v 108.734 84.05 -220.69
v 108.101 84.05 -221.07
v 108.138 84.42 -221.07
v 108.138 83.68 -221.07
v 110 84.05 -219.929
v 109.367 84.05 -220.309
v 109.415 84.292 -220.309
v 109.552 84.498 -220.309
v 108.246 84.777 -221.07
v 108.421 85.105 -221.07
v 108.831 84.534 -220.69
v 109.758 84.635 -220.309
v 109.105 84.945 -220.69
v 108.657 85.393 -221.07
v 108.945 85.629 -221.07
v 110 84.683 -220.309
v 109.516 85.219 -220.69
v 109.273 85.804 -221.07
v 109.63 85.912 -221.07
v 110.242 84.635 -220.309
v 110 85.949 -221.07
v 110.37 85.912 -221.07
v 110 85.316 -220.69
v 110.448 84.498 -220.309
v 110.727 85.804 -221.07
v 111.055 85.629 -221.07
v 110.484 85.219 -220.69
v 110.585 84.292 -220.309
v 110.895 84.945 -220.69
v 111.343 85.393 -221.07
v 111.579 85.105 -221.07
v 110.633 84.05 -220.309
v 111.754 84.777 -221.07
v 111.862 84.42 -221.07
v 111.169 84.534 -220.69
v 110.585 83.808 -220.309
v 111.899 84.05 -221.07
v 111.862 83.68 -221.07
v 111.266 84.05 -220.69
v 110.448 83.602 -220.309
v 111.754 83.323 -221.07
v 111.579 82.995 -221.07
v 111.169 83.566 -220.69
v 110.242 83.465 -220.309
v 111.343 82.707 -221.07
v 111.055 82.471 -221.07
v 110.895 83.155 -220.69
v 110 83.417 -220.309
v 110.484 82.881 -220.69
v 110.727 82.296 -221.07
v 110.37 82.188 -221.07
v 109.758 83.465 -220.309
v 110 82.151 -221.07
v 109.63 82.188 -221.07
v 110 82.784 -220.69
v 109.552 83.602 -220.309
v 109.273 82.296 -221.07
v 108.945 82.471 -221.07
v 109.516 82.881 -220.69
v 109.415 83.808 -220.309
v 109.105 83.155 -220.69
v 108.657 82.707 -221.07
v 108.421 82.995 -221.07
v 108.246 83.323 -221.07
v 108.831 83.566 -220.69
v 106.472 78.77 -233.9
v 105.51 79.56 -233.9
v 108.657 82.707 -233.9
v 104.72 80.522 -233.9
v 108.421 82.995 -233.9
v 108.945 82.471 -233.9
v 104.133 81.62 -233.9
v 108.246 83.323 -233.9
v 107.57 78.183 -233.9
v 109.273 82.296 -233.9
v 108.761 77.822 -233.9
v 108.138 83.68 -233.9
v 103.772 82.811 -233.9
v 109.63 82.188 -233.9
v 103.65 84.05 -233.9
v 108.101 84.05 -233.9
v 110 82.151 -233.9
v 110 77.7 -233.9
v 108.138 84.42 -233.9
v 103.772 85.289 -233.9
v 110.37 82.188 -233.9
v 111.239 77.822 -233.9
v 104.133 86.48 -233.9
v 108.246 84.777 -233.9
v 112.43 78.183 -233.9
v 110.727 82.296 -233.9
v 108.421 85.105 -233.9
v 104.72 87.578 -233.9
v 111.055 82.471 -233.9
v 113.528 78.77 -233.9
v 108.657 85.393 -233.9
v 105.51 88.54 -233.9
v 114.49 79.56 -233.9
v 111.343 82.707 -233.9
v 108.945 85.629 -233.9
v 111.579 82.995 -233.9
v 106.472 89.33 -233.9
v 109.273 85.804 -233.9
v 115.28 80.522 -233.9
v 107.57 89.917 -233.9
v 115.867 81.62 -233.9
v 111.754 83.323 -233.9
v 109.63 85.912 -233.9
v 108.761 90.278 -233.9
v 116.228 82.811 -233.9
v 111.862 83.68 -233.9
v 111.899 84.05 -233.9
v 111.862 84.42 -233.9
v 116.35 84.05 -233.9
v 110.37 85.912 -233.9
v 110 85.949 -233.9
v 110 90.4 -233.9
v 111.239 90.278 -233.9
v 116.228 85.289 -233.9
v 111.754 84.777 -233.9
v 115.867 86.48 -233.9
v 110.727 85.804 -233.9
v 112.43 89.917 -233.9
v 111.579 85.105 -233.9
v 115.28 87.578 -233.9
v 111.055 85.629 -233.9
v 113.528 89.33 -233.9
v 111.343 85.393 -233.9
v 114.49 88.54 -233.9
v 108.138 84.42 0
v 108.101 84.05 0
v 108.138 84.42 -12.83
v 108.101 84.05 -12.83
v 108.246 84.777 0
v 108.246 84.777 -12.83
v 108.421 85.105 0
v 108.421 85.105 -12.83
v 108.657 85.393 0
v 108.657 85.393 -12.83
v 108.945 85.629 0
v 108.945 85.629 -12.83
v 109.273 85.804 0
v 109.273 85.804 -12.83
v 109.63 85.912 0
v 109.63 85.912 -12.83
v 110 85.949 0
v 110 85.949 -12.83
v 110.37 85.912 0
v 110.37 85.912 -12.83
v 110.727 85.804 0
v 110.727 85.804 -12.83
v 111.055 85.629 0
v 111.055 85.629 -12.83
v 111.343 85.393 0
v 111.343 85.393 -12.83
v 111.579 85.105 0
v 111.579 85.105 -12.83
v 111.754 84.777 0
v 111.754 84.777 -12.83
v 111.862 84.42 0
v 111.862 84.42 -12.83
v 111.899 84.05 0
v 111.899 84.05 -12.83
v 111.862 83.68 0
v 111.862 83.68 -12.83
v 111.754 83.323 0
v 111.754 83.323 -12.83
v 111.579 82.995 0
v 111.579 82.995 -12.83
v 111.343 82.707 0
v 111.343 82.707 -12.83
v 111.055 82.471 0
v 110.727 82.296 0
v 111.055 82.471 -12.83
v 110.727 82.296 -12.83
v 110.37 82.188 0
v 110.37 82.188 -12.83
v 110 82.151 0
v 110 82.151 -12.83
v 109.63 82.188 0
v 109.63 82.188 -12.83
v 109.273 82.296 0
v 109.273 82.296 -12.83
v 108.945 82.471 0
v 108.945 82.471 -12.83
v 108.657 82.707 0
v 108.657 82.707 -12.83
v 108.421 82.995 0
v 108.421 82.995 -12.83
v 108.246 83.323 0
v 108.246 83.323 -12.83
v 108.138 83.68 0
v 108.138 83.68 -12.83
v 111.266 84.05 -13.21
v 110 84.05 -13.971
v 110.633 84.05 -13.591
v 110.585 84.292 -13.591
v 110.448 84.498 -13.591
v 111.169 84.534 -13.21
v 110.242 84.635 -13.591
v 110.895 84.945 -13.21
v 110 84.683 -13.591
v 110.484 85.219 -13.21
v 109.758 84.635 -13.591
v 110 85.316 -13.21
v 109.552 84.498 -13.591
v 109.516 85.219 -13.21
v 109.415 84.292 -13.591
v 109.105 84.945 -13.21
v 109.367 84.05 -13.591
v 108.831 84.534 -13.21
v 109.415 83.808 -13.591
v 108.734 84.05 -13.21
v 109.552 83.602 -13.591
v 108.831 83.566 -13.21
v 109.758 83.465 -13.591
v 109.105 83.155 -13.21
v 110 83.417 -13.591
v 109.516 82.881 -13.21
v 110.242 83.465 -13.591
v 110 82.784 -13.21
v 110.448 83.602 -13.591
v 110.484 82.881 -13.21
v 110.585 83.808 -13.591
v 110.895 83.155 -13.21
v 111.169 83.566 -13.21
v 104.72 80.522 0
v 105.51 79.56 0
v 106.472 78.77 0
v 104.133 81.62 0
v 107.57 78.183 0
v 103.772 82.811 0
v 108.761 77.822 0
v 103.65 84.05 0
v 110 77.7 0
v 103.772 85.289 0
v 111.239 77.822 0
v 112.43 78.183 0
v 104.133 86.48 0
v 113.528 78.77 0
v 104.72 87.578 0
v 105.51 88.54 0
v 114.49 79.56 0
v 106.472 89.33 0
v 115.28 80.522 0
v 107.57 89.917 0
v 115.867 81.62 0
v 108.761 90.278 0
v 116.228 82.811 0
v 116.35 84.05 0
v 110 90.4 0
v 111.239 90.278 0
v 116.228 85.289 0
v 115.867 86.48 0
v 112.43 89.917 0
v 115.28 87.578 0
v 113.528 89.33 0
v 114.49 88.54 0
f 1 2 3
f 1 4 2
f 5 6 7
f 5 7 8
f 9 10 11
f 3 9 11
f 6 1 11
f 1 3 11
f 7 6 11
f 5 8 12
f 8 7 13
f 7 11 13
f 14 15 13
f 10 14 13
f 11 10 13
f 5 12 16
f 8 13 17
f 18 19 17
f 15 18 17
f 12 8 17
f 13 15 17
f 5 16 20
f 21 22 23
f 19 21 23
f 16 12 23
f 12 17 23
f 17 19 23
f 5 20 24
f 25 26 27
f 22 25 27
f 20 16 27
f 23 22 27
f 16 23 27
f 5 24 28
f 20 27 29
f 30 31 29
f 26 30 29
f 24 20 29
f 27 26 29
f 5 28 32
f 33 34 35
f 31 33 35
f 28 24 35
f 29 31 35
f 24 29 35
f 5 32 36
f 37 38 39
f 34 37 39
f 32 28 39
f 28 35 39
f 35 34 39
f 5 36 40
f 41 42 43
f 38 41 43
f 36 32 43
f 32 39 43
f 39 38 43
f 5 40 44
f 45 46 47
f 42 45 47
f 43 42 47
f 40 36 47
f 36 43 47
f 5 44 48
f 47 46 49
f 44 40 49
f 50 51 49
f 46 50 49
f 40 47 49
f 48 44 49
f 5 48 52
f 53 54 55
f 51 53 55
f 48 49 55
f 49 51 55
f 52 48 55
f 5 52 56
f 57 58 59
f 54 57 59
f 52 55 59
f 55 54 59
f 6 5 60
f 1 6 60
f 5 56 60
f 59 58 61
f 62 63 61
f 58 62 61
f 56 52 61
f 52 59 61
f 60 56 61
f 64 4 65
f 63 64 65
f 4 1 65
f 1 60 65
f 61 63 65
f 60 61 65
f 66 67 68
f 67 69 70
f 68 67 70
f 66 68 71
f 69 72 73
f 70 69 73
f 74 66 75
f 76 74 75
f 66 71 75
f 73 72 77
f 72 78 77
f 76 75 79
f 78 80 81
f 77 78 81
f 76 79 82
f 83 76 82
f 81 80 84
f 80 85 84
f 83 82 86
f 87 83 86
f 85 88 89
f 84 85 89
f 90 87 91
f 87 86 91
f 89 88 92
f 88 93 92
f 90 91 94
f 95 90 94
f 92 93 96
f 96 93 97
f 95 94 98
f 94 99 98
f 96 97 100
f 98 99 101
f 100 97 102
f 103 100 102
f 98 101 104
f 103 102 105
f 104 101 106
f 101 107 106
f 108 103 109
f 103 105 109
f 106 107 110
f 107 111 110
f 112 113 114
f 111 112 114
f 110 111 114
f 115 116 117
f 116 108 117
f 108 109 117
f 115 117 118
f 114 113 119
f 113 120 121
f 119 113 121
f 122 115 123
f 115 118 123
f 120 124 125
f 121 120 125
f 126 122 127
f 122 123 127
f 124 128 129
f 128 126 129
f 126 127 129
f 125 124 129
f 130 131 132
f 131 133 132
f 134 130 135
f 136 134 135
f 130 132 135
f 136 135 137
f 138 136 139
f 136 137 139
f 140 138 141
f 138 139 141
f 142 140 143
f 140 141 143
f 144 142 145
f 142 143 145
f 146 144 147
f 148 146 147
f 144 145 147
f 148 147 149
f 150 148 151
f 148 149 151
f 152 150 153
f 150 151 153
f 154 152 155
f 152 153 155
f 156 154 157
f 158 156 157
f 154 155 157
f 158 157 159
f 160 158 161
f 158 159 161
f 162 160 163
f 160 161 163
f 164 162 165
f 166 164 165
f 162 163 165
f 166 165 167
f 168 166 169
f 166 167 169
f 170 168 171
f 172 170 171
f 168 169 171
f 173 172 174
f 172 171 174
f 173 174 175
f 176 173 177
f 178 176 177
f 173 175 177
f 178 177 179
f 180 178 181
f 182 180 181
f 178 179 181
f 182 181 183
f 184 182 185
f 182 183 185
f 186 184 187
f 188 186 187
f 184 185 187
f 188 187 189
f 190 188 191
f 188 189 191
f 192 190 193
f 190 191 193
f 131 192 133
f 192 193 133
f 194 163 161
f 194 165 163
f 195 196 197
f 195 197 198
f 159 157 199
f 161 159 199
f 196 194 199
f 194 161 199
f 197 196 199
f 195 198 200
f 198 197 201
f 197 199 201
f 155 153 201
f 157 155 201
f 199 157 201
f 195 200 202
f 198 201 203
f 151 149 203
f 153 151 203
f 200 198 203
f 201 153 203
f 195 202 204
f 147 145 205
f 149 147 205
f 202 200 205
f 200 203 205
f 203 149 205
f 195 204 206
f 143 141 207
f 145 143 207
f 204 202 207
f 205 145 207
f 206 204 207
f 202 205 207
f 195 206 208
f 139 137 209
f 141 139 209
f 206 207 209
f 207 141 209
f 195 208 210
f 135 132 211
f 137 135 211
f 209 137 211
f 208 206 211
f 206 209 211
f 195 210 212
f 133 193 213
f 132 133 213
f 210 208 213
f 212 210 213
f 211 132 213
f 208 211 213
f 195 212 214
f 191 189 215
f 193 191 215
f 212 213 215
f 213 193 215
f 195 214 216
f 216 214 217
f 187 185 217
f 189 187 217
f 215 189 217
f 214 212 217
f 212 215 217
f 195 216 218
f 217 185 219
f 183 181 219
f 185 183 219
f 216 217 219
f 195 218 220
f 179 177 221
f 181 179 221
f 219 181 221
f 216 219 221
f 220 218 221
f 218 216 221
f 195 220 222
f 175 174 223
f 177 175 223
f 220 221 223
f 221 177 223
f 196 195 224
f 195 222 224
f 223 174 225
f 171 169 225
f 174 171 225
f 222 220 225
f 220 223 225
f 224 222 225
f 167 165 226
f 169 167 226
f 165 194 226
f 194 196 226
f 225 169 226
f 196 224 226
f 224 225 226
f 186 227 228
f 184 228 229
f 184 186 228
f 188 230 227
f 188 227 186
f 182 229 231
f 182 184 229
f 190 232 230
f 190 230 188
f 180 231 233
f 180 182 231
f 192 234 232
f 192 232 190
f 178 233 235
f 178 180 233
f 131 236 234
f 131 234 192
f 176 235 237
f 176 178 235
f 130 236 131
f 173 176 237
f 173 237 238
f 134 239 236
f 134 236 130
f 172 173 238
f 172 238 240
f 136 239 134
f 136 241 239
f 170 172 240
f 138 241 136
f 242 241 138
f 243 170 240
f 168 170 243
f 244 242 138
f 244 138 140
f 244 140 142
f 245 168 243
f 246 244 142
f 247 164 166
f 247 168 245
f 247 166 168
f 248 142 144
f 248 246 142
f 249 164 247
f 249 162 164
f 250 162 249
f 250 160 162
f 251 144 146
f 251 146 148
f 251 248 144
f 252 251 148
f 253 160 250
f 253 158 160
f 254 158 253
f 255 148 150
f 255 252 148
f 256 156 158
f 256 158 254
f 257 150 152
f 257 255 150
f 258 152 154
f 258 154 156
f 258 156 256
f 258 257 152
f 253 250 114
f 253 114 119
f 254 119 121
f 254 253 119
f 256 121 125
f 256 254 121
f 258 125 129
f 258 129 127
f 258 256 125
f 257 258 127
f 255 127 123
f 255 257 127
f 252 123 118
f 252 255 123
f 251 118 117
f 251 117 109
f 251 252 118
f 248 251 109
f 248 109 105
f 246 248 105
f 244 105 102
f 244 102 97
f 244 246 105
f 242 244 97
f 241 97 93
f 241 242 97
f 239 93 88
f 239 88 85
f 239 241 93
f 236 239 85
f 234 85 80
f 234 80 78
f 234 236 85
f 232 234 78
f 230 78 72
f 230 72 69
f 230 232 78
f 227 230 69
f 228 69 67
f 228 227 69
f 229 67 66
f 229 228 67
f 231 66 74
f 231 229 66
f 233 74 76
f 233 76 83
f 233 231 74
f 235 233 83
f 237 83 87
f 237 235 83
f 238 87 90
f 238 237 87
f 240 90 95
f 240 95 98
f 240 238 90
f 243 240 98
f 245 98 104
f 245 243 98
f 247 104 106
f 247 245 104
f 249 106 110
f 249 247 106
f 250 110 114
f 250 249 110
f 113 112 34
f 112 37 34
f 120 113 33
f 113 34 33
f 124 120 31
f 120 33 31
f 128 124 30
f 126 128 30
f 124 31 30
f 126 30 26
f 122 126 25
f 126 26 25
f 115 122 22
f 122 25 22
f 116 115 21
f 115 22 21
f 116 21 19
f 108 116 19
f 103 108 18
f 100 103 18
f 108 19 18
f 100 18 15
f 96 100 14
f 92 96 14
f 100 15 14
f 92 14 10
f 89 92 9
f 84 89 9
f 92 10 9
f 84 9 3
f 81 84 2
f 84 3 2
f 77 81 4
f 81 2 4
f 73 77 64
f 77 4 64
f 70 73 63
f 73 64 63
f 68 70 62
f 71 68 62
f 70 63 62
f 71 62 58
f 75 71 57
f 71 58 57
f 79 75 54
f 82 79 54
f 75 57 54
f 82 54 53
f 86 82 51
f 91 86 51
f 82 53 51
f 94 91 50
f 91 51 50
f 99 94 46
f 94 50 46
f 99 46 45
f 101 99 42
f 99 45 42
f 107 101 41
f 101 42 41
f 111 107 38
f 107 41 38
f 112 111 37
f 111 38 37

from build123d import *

# Parameters (mm, degrees)
SKETCH1_R                  = 6.35
BOSS_EXTRUDE1_DEPTH        = 233.9
F_10_24_TAPPED_HOLE1_D     = 3.7973
F_10_24_TAPPED_HOLE1_DEPTH = 12.83
F_10_24_TAPPED_HOLE1_TIP   = 1.140824014
F_10_24_TAPPED_HOLE2_D     = 3.7973
F_10_24_TAPPED_HOLE2_DEPTH = 12.83
F_10_24_TAPPED_HOLE2_TIP   = 1.140824014


with BuildPart() as part:
    # Sketch1 → Boss-Extrude1 (new body)
    with BuildSketch(Plane.XY):
        with Locations((110, 84.05)):
            Circle(SKETCH1_R)
    extrude(amount=-BOSS_EXTRUDE1_DEPTH)

    # #10-24 Tapped Hole1
    with Locations(Plane.XY):
        with Locations((110, 84.05)):
            Hole(F_10_24_TAPPED_HOLE1_D / 2, depth=F_10_24_TAPPED_HOLE1_DEPTH)
            with Locations((0, 0, -(F_10_24_TAPPED_HOLE1_DEPTH + F_10_24_TAPPED_HOLE1_TIP / 2))):  # 118° drill point
                Cone(0, F_10_24_TAPPED_HOLE1_D / 2, F_10_24_TAPPED_HOLE1_TIP, mode=Mode.SUBTRACT)

    # #10-24 Tapped Hole2
    with Locations(Plane(origin=(0, 0, -233.9), x_dir=(-1, 0, 0), z_dir=(0, 0, -1))):
        with Locations((-110, 84.05)):
            Hole(F_10_24_TAPPED_HOLE2_D / 2, depth=F_10_24_TAPPED_HOLE2_DEPTH)
            with Locations((0, 0, -(F_10_24_TAPPED_HOLE2_DEPTH + F_10_24_TAPPED_HOLE2_TIP / 2))):  # 118° drill point
                Cone(0, F_10_24_TAPPED_HOLE2_D / 2, F_10_24_TAPPED_HOLE2_TIP, mode=Mode.SUBTRACT)


solid = part.part
